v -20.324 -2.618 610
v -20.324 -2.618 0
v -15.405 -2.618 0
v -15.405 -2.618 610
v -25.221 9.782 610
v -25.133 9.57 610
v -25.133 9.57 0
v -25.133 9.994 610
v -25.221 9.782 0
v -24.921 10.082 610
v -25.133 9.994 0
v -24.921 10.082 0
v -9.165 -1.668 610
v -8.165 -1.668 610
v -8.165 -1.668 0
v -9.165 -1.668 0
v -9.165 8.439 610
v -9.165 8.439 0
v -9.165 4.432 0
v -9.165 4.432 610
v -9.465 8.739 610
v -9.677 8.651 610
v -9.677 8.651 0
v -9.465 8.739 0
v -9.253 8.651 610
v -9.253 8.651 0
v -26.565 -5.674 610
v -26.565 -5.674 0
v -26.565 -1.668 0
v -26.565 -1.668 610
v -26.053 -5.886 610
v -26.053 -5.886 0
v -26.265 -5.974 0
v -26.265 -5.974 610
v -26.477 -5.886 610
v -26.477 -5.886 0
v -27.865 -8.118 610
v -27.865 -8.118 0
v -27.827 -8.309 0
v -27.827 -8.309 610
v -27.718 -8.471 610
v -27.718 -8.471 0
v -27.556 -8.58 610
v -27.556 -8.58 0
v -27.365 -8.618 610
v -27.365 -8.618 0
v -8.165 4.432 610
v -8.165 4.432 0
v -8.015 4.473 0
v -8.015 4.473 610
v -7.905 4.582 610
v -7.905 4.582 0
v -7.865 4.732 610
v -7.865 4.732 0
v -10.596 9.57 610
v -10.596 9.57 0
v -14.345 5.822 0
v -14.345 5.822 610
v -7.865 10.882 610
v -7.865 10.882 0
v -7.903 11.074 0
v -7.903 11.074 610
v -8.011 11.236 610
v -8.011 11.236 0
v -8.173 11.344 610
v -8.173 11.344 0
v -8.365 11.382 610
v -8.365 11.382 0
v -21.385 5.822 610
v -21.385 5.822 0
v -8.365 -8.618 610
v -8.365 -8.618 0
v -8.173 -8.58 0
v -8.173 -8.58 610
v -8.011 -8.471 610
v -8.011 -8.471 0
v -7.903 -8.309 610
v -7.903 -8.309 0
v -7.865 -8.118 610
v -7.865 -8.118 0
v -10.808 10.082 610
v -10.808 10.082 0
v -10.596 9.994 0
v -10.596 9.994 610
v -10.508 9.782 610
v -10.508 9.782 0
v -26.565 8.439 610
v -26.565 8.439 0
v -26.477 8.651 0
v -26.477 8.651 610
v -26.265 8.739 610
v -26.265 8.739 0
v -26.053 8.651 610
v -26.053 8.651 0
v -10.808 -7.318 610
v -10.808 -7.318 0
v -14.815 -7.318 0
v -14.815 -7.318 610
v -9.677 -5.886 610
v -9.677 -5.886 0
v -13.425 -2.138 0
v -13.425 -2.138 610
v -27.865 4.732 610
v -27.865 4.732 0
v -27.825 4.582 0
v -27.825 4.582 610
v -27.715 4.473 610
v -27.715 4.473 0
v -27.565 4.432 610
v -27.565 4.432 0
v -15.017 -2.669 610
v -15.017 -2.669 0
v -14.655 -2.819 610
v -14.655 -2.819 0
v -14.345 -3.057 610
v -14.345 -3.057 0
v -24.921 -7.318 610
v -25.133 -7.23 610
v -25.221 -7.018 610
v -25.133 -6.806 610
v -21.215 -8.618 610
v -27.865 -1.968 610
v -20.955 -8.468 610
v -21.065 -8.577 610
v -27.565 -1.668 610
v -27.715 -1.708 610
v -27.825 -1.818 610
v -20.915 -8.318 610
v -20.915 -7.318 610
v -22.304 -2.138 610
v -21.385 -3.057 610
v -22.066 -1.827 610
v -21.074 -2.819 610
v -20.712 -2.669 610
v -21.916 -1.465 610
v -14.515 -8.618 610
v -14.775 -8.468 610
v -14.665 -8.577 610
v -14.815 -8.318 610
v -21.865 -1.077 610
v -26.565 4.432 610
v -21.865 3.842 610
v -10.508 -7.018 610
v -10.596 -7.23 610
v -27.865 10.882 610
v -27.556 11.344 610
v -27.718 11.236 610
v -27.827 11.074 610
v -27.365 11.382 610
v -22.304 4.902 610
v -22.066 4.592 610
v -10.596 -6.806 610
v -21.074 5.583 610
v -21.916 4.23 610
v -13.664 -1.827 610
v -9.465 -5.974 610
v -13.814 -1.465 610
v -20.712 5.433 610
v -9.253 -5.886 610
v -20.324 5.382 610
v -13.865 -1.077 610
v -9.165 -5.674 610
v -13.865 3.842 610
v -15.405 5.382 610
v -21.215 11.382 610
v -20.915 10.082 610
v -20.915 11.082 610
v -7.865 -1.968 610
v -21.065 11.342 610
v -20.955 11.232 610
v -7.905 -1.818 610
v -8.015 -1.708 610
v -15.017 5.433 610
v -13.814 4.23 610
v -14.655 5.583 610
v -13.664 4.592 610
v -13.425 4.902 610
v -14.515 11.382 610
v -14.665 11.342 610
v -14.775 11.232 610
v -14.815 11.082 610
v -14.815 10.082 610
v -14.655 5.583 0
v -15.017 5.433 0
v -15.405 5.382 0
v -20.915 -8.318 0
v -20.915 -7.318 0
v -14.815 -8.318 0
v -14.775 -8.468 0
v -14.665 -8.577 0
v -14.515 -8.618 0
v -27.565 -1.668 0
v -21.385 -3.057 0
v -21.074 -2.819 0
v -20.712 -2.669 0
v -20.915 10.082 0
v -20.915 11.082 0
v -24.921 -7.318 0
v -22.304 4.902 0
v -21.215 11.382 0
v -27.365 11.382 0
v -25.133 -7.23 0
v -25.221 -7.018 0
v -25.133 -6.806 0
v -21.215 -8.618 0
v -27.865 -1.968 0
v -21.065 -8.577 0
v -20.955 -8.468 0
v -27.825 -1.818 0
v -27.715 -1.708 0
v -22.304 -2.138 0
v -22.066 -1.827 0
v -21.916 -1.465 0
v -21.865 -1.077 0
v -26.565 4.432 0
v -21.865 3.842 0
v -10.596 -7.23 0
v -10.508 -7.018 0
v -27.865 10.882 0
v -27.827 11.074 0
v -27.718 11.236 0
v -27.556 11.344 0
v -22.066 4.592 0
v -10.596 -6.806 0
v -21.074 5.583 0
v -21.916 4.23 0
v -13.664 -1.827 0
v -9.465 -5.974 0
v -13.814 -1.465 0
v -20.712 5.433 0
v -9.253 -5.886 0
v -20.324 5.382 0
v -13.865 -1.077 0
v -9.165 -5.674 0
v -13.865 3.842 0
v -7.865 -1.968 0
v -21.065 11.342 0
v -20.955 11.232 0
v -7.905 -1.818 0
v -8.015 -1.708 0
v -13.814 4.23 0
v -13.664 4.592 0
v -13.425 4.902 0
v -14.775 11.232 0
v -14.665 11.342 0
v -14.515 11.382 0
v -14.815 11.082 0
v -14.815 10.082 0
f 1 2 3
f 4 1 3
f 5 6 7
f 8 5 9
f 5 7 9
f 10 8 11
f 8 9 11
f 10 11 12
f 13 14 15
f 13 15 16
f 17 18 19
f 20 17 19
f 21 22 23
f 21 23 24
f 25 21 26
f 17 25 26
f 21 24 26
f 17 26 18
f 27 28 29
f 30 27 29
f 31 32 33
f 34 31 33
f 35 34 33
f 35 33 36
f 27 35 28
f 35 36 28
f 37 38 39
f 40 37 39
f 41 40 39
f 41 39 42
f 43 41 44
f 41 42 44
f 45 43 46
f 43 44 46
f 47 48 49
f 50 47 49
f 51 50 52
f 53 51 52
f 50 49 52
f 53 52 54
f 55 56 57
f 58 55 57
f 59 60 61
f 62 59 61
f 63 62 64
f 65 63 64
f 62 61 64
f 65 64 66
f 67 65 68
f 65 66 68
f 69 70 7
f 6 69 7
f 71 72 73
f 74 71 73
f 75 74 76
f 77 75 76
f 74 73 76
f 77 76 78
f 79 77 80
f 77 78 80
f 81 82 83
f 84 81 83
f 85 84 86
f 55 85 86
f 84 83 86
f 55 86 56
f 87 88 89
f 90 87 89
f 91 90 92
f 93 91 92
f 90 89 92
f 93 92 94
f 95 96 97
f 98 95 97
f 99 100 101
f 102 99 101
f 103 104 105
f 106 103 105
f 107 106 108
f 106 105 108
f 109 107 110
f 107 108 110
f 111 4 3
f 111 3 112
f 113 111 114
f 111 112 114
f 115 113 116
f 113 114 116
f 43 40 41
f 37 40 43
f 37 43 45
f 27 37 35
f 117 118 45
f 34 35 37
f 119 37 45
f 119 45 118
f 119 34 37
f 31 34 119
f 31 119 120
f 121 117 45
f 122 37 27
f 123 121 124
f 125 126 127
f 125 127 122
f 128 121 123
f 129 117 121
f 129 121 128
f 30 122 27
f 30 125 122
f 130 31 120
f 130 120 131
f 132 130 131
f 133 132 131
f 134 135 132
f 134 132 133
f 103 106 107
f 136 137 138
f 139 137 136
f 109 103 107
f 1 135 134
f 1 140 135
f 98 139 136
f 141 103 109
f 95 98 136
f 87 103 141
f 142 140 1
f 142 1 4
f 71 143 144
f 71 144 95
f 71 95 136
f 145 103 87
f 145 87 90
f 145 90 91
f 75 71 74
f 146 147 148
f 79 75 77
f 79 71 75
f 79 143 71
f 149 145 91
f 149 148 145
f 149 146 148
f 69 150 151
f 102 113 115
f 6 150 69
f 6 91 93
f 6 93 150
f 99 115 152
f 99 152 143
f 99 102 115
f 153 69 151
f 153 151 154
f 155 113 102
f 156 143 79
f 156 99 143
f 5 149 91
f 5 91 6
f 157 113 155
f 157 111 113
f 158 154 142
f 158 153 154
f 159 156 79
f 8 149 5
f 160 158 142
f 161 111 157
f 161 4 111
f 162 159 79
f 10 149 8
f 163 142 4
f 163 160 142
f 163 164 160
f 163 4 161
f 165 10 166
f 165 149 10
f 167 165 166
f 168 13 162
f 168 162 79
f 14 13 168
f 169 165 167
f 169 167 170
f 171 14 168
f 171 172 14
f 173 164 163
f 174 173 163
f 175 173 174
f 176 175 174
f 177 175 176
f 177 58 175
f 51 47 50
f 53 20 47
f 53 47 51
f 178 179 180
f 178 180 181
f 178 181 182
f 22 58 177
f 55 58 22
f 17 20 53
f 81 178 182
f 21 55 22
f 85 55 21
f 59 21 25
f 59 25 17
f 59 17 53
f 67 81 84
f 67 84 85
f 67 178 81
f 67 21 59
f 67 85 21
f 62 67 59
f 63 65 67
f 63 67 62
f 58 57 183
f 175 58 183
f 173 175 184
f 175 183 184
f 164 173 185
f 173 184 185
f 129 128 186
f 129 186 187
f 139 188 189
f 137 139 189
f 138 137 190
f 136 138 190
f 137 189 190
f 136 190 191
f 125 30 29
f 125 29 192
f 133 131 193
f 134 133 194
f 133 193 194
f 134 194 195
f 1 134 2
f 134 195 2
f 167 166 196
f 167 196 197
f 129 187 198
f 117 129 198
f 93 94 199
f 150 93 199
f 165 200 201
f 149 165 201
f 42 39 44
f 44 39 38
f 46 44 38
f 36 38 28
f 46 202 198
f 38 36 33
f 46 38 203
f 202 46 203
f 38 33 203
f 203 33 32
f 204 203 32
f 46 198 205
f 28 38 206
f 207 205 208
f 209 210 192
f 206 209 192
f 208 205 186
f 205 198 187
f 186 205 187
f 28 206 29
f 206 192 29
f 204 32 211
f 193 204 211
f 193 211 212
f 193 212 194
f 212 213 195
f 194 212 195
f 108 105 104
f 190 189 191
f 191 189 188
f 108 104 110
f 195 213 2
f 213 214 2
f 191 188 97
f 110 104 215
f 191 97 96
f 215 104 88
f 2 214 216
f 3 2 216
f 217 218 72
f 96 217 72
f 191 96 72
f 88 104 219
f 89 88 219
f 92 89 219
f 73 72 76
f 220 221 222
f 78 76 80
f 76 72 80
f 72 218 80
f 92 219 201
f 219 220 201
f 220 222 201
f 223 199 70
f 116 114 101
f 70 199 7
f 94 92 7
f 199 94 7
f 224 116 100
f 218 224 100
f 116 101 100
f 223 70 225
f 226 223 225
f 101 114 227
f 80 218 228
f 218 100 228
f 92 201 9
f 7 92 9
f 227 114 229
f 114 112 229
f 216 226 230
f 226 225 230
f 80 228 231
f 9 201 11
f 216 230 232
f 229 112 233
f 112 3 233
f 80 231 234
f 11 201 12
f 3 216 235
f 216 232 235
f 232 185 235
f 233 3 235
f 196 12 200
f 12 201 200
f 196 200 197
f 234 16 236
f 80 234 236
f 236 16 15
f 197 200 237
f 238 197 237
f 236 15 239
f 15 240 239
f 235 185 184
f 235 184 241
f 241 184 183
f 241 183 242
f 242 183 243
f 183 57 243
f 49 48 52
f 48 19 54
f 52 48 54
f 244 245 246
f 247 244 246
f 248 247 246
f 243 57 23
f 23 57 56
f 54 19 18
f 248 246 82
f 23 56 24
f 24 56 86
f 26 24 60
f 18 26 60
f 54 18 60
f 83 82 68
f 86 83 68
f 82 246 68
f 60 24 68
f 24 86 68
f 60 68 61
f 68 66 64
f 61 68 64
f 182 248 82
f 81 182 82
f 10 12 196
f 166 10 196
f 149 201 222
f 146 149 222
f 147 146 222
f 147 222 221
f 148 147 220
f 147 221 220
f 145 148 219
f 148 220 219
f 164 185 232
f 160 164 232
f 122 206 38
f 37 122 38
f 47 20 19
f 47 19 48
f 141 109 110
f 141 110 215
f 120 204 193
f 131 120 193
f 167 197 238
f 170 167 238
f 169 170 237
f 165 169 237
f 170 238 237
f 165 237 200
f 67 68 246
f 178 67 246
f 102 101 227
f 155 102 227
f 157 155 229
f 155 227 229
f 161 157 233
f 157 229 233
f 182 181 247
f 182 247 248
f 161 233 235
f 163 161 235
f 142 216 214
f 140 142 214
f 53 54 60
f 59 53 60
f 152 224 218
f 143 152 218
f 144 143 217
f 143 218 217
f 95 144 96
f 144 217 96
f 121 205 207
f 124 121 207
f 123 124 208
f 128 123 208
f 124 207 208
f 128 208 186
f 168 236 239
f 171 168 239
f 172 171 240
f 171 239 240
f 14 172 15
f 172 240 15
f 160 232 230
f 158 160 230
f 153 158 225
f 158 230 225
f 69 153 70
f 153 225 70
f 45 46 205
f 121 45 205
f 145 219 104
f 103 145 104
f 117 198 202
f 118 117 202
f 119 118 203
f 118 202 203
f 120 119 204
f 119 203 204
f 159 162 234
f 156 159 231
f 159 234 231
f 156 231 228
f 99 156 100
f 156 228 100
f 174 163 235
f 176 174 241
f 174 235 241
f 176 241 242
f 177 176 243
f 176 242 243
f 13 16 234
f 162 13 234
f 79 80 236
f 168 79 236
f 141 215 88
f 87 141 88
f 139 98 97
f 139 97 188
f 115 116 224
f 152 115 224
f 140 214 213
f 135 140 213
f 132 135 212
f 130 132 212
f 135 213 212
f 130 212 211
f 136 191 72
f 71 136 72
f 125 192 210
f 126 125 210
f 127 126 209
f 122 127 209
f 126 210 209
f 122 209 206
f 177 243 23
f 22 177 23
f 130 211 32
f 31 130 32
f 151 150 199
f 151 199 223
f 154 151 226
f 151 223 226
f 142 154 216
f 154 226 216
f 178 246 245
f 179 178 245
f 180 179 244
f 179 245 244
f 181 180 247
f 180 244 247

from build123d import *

# Parameters (mm, degrees)
BOSS_EXTRUDE1_DEPTH = 610


with BuildPart() as part:
    # Sketch1 → Boss-Extrude1 (new body)
    with BuildSketch(Plane.XY):
        with BuildLine():
            Line((-9.676936556, -5.886265937), (-13.425464694, -2.1377378))
            ThreePointArc((-13.425464694, -2.1377378), (-13.750623821, -1.651102776), (-13.864804522, -1.077077628))
            Line((-13.864804522, -1.077077628), (-13.864804522, 3.841804054))
            ThreePointArc((-13.864804522, 3.841804054), (-13.750623821, 4.415829202), (-13.425464694, 4.902464226))
            Line((-13.425464694, 4.902464226), (-9.676936556, 8.650992363))
            ThreePointArc((-9.676936556, 8.650992363), (-9.349999492, 8.716024189), (-9.164804522, 8.438860329))
            Line((-9.164804522, 8.438860329), (-9.164804522, 4.432363213))
            Line((-9.164804522, 4.432363213), (-8.164804522, 4.432363213))
            ThreePointArc((-8.164804522, 4.432363213), (-7.952672488, 4.520231179), (-7.864804522, 4.732363213))
            Line((-7.864804522, 4.732363213), (-7.864804522, 10.882363213))
            ThreePointArc((-7.864804522, 10.882363213), (-8.011251131, 11.235916604), (-8.364804522, 11.382363213))
            Line((-8.364804522, 11.382363213), (-14.514804522, 11.382363213))
            ThreePointArc((-14.514804522, 11.382363213), (-14.726936556, 11.294495247), (-14.814804522, 11.082363213))
            Line((-14.814804522, 11.082363213), (-14.814804522, 10.082363213))
            Line((-14.814804522, 10.082363213), (-10.808307406, 10.082363213))
            ThreePointArc((-10.808307406, 10.082363213), (-10.531143546, 9.897168243), (-10.596175372, 9.570231179))
            Line((-10.596175372, 9.570231179), (-14.344703509, 5.821703041))
            ThreePointArc((-14.344703509, 5.821703041), (-14.831338532, 5.496543914), (-15.405363681, 5.382363213))
            Line((-15.405363681, 5.382363213), (-20.324245363, 5.382363213))
            ThreePointArc((-20.324245363, 5.382363213), (-20.898270511, 5.496543914), (-21.384905535, 5.821703041))
            Line((-21.384905535, 5.821703041), (-25.133433672, 9.570231179))
            ThreePointArc((-25.133433672, 9.570231179), (-25.198465497, 9.897168243), (-24.921301638, 10.082363213))
            Line((-24.921301638, 10.082363213), (-20.914804522, 10.082363213))
            Line((-20.914804522, 10.082363213), (-20.914804522, 11.082363213))
            ThreePointArc((-20.914804522, 11.082363213), (-21.002672488, 11.294495247), (-21.214804522, 11.382363213))
            Line((-21.214804522, 11.382363213), (-27.364804522, 11.382363213))
            ThreePointArc((-27.364804522, 11.382363213), (-27.718357912, 11.235916604), (-27.864804522, 10.882363213))
            Line((-27.864804522, 10.882363213), (-27.864804522, 4.732363213))
            ThreePointArc((-27.864804522, 4.732363213), (-27.776936556, 4.520231179), (-27.564804522, 4.432363213))
            Line((-27.564804522, 4.432363213), (-26.564804522, 4.432363213))
            Line((-26.564804522, 4.432363213), (-26.564804522, 8.438860329))
            ThreePointArc((-26.564804522, 8.438860329), (-26.379609552, 8.716024189), (-26.052672488, 8.650992363))
            Line((-26.052672488, 8.650992363), (-22.30414435, 4.902464226))
            ThreePointArc((-22.30414435, 4.902464226), (-21.978985223, 4.415829202), (-21.864804522, 3.841804054))
            Line((-21.864804522, 3.841804054), (-21.864804522, -1.077077628))
            ThreePointArc((-21.864804522, -1.077077628), (-21.978985223, -1.651102776), (-22.30414435, -2.1377378))
            Line((-22.30414435, -2.1377378), (-26.052672488, -5.886265937))
            ThreePointArc((-26.052672488, -5.886265937), (-26.379609552, -5.951297762), (-26.564804522, -5.674133903))
            Line((-26.564804522, -5.674133903), (-26.564804522, -1.667636787))
            Line((-26.564804522, -1.667636787), (-27.564804522, -1.667636787))
            ThreePointArc((-27.564804522, -1.667636787), (-27.776936556, -1.755504753), (-27.864804522, -1.967636787))
            Line((-27.864804522, -1.967636787), (-27.864804522, -8.117636787))
            ThreePointArc((-27.864804522, -8.117636787), (-27.718357912, -8.471190178), (-27.364804522, -8.617636787))
            Line((-27.364804522, -8.617636787), (-21.214804522, -8.617636787))
            ThreePointArc((-21.214804522, -8.617636787), (-21.002672488, -8.529768821), (-20.914804522, -8.317636787))
            Line((-20.914804522, -8.317636787), (-20.914804522, -7.317636787))
            Line((-20.914804522, -7.317636787), (-24.921301638, -7.317636787))
            ThreePointArc((-24.921301638, -7.317636787), (-25.198465497, -7.132441817), (-25.133433672, -6.805504753))
            Line((-25.133433672, -6.805504753), (-21.384905535, -3.056976615))
            ThreePointArc((-21.384905535, -3.056976615), (-20.898270511, -2.731817488), (-20.324245363, -2.617636787))
            Line((-20.324245363, -2.617636787), (-15.405363681, -2.617636787))
            ThreePointArc((-15.405363681, -2.617636787), (-14.831338532, -2.731817488), (-14.344703509, -3.056976615))
            Line((-14.344703509, -3.056976615), (-10.596175372, -6.805504753))
            ThreePointArc((-10.596175372, -6.805504753), (-10.531143546, -7.132441817), (-10.808307406, -7.317636787))
            Line((-10.808307406, -7.317636787), (-14.814804522, -7.317636787))
            Line((-14.814804522, -7.317636787), (-14.814804522, -8.317636787))
            ThreePointArc((-14.814804522, -8.317636787), (-14.726936556, -8.529768821), (-14.514804522, -8.617636787))
            Line((-14.514804522, -8.617636787), (-8.364804522, -8.617636787))
            ThreePointArc((-8.364804522, -8.617636787), (-8.011251131, -8.471190178), (-7.864804522, -8.117636787))
            Line((-7.864804522, -8.117636787), (-7.864804522, -1.967636787))
            ThreePointArc((-7.864804522, -1.967636787), (-7.952672488, -1.755504753), (-8.164804522, -1.667636787))
            Line((-8.164804522, -1.667636787), (-9.164804522, -1.667636787))
            Line((-9.164804522, -1.667636787), (-9.164804522, -5.674133903))
            ThreePointArc((-9.164804522, -5.674133903), (-9.349999492, -5.951297762), (-9.676936556, -5.886265937))
        make_face()
    extrude(amount=BOSS_EXTRUDE1_DEPTH)


solid = part.part
